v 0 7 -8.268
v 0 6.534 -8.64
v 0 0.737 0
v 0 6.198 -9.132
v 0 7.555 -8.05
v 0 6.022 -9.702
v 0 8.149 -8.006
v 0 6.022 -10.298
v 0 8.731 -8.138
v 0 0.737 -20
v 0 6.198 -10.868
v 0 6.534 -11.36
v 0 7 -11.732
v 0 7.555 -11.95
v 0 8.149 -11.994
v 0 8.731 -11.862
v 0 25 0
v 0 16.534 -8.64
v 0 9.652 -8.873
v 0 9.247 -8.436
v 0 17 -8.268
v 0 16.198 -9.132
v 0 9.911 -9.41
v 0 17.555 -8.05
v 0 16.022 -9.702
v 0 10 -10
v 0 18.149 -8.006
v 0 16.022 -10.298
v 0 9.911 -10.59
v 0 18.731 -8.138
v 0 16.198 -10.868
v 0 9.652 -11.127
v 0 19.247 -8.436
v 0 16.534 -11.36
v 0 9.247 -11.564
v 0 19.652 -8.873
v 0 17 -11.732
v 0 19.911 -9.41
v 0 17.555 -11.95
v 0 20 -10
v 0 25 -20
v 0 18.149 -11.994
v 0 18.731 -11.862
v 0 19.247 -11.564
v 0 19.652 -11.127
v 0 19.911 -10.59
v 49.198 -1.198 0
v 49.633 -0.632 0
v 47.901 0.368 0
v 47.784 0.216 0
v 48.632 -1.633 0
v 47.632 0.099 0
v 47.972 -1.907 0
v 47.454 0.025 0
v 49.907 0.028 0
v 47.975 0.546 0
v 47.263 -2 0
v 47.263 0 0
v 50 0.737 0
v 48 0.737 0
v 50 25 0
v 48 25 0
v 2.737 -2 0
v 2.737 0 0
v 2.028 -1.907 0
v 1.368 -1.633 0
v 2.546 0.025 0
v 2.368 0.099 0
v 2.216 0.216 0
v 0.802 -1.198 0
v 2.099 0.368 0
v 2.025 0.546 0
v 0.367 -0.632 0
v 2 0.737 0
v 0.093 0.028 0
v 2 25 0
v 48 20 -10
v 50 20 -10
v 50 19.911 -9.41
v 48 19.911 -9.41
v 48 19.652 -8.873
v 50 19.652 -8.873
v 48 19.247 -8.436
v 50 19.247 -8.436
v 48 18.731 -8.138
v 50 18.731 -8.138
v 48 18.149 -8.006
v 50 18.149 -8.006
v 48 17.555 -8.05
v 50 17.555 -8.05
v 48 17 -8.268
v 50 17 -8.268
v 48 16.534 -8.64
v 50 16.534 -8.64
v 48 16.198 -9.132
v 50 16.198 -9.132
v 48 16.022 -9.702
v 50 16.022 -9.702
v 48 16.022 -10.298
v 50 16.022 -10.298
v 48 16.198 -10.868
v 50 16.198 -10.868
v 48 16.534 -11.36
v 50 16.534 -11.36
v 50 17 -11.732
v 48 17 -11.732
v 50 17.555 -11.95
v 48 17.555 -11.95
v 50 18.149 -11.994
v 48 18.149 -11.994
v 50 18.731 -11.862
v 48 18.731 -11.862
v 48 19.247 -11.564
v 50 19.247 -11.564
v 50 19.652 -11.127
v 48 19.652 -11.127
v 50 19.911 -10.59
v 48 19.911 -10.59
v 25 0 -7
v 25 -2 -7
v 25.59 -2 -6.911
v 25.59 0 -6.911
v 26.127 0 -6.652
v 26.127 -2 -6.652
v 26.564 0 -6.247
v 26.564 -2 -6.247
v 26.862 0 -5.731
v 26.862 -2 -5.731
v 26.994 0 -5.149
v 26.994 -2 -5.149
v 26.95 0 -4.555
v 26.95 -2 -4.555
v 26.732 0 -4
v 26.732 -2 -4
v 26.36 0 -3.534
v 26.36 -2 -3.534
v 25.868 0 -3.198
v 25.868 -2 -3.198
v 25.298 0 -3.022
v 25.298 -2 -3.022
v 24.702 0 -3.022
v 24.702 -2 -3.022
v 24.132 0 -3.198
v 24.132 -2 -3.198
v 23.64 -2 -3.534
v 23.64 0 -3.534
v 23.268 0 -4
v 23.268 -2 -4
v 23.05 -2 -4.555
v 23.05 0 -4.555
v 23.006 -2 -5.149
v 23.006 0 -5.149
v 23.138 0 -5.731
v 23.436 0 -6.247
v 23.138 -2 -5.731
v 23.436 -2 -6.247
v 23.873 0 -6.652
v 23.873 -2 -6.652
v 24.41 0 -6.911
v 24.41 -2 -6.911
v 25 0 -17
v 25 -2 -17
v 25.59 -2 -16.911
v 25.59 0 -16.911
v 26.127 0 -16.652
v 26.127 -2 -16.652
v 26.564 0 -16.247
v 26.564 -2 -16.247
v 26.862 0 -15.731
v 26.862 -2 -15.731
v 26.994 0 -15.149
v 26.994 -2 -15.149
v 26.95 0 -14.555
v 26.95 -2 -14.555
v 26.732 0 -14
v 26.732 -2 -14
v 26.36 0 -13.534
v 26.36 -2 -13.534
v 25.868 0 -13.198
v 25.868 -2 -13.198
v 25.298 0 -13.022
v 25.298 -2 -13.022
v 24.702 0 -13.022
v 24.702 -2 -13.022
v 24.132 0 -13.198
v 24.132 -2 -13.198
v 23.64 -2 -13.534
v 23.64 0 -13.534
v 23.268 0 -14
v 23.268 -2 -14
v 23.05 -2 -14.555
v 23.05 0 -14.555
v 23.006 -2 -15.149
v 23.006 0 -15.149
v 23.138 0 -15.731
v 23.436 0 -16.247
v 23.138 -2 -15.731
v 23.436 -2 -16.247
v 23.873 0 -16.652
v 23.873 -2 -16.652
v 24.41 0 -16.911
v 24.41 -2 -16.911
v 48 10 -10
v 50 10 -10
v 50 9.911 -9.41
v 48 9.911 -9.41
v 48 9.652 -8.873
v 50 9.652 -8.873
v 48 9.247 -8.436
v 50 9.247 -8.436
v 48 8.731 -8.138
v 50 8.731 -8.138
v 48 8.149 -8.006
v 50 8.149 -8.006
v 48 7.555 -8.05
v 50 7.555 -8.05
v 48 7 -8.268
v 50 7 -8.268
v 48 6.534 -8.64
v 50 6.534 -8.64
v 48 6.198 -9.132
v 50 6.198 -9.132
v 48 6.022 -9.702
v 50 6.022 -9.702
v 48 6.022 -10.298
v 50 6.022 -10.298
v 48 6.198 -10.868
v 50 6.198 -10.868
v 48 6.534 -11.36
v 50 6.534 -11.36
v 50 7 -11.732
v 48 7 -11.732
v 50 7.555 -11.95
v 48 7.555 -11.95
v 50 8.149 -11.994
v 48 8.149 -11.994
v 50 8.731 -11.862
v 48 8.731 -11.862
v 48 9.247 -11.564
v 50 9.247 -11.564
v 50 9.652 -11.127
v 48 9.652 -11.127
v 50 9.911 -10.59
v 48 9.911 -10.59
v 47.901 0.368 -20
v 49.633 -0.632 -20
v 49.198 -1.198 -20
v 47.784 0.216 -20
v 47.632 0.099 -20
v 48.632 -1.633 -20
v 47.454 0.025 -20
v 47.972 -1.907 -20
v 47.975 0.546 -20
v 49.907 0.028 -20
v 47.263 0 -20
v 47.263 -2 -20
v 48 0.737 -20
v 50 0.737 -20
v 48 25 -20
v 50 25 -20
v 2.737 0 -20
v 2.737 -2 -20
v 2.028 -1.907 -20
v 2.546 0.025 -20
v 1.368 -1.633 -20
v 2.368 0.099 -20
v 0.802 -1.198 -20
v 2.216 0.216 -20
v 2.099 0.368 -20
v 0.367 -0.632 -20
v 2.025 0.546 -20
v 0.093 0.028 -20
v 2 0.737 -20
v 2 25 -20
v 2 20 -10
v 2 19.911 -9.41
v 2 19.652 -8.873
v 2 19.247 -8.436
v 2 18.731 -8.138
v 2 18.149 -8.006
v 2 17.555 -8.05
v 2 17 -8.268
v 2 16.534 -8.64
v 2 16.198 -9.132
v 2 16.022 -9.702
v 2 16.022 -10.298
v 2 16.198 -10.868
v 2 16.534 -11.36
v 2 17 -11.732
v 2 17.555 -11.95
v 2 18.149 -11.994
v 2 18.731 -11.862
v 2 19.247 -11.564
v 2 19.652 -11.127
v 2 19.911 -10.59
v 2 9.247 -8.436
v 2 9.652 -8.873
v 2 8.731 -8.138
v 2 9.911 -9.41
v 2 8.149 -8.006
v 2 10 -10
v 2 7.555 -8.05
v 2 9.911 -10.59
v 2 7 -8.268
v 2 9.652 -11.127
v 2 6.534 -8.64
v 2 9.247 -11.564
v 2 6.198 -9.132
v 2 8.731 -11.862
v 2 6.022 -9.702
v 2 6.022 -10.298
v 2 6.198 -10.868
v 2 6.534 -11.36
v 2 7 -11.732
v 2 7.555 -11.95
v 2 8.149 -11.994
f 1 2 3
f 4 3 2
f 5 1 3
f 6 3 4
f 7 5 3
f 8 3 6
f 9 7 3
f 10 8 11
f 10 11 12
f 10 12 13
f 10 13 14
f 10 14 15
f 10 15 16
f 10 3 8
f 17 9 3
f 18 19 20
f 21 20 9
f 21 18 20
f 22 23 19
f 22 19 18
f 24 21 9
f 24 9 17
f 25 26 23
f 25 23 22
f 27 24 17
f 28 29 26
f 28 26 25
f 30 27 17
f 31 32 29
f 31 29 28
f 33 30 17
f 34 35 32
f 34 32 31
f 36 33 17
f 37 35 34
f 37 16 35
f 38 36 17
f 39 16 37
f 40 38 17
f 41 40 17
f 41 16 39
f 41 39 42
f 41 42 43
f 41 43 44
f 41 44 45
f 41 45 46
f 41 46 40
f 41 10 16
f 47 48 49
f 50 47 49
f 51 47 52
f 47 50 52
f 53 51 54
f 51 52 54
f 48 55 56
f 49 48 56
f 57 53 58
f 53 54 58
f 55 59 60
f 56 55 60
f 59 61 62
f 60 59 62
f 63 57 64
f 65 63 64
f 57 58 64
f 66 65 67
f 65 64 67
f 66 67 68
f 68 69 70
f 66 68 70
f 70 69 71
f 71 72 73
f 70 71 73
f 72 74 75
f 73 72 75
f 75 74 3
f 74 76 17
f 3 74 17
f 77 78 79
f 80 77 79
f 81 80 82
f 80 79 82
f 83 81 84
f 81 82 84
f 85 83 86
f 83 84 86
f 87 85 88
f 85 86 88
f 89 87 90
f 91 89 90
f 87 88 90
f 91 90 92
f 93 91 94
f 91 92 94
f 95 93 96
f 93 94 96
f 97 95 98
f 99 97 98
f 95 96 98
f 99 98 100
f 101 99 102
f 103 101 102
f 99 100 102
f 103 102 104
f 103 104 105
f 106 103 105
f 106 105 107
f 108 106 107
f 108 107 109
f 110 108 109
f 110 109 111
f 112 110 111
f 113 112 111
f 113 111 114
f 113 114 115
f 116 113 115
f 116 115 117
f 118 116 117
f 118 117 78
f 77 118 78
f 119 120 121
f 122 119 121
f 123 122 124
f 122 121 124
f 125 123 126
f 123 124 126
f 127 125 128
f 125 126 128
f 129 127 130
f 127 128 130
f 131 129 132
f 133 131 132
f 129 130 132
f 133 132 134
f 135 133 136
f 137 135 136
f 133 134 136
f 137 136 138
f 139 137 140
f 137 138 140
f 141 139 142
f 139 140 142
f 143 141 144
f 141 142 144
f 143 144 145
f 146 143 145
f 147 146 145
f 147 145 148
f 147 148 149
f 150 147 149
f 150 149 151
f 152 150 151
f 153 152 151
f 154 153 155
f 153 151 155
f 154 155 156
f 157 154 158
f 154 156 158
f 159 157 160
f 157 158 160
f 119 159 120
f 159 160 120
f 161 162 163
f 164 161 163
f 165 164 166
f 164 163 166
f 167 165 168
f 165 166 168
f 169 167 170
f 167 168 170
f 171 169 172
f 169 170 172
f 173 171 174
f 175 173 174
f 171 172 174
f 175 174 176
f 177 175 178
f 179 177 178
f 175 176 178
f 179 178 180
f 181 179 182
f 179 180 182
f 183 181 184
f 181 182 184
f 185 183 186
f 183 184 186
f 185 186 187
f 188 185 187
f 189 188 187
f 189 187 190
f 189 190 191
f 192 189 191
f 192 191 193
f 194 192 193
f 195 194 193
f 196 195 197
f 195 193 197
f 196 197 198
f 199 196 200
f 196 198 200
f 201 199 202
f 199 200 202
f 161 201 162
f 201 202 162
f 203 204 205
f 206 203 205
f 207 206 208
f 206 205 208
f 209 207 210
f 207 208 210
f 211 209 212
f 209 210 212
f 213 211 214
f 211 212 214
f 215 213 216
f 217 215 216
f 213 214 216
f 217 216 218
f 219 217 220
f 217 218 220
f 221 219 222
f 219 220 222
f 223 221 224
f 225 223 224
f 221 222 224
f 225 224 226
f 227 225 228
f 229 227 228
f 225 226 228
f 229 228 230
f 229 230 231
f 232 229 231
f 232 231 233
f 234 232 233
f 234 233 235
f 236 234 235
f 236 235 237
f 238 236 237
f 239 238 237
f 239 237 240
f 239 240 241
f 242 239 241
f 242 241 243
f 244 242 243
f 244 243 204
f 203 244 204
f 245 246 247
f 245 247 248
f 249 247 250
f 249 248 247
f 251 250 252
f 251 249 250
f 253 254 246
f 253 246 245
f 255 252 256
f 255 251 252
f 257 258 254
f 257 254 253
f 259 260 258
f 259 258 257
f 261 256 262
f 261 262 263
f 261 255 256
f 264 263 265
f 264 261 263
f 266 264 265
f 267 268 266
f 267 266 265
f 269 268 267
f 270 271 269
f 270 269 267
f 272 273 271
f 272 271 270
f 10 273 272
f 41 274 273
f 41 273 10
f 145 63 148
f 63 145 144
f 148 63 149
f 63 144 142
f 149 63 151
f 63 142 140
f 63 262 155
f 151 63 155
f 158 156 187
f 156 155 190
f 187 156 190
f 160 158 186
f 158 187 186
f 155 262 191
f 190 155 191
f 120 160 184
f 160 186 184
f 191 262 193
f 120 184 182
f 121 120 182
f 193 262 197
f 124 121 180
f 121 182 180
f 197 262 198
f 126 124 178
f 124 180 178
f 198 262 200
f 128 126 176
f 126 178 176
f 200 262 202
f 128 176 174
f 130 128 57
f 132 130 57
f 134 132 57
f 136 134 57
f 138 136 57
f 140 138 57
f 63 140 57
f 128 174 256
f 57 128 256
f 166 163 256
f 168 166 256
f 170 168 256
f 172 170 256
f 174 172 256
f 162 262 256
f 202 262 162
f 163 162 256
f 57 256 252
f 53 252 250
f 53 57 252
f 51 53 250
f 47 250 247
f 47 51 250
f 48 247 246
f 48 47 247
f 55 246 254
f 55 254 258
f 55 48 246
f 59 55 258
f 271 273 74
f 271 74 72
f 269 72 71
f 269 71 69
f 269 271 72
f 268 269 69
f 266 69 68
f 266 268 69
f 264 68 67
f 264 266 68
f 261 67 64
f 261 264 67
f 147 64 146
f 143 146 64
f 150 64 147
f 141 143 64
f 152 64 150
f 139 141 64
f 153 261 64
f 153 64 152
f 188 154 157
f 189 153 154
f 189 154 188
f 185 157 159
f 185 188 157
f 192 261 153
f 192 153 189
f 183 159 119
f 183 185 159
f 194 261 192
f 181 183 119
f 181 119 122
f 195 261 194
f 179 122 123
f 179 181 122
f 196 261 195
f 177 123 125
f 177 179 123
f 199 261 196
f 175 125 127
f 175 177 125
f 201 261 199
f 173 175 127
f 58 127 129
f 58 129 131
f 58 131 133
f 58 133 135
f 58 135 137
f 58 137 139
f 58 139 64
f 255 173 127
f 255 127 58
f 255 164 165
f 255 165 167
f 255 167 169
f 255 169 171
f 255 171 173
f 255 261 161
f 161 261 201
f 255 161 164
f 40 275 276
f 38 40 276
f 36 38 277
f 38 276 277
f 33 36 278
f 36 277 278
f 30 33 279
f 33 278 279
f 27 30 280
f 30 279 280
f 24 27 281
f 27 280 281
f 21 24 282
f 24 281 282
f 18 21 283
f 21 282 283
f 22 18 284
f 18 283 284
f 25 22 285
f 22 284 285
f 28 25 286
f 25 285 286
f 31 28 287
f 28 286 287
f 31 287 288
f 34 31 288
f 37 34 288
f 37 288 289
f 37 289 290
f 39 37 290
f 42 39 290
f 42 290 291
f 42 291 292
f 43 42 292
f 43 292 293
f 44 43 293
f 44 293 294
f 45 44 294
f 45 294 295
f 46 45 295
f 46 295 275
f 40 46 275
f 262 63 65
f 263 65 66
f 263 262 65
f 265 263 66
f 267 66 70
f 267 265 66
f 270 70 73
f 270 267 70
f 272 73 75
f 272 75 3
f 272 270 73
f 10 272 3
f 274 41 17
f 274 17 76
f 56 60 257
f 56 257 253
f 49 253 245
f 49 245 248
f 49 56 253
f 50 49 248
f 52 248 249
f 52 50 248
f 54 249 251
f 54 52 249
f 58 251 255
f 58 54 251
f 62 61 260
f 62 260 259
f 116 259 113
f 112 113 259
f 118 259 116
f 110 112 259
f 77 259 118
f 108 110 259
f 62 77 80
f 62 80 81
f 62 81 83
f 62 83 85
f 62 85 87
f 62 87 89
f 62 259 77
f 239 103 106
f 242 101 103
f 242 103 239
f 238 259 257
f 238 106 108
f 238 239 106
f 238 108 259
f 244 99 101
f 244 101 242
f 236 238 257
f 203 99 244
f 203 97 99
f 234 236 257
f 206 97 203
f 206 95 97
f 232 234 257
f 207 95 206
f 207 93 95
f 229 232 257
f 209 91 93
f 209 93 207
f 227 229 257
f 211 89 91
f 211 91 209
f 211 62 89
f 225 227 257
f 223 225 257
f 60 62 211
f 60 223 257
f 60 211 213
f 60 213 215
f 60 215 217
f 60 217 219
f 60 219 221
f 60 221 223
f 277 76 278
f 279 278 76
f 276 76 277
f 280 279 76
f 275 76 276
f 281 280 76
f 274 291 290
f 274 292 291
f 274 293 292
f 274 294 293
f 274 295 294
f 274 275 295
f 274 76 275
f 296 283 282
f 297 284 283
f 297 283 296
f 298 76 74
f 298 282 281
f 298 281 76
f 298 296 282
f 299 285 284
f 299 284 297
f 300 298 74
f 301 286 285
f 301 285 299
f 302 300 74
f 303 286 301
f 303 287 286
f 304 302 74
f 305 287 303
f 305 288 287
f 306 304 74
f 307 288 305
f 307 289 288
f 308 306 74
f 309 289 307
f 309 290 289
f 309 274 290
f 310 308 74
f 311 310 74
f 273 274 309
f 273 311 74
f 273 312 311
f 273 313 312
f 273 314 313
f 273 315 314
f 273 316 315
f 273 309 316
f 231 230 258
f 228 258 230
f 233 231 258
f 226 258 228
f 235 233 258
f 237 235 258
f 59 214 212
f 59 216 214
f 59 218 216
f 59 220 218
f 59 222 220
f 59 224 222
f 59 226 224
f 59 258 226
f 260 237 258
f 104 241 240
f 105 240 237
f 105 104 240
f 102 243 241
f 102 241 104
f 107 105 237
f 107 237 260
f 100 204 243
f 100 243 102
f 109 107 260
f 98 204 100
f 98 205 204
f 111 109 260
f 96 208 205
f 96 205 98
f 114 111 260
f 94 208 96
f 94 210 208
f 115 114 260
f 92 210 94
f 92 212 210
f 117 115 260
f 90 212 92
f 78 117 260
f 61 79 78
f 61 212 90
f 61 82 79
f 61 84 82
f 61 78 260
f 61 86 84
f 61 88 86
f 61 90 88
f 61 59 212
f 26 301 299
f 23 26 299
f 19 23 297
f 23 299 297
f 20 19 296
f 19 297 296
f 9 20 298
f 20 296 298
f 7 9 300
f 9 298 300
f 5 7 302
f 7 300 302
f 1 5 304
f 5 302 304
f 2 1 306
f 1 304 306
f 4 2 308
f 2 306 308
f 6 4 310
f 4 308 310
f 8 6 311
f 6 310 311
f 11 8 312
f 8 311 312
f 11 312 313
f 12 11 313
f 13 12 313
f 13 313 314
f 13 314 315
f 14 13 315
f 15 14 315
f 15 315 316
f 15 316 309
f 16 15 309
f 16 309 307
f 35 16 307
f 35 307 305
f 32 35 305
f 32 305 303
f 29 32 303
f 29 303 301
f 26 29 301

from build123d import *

# Parameters (mm, degrees)
SKETCH_1_W                       = 50
SKETCH_1_H                       = 20
SM_BASE_FLANGE_1_DEPTH           = 2
SM_EDGE_FLANGE_1_STRIP_W         = 9.4732
SM_EDGE_FLANGE_1_STRIP_H         = 2
SM_EDGE_FLANGE_1_STRIP_CUT_DEPTH = 20
SM_EDGE_FLANGE_1_DEPTH           = 20
SM_EDGE_FLANGE_2_STRIP_W         = 9.4732
SM_EDGE_FLANGE_2_STRIP_H         = 2
SM_EDGE_FLANGE_2_STRIP_CUT_DEPTH = 20
SM_EDGE_FLANGE_2_DEPTH           = 20
SKETCH_12_R                      = 2
CUT_EXTRUDE_1_DEPTH              = 2
CUT_EXTRUDE_2_REACH              = 61.372
SKETCH_13_R                      = 2


# Sheet-metal steps are written as plain solids
with BuildPart() as part:
    # Sketch 1 → Базовая кромка1 (new body)
    with BuildSketch(Plane(origin=(0, 0, 0), x_dir=(1, 0, 0), z_dir=(0, 1, 0))):
        with Locations((25, 10)):
            Rectangle(SKETCH_1_W, SKETCH_1_H)
    extrude(amount=-SM_BASE_FLANGE_1_DEPTH)

    # Ребро-кромка1 strip (across the edge) → Ребро-кромка1 strip cut (cut)
    with BuildSketch(Plane(origin=(50, 0, 0), x_dir=(-1, 0, 0), z_dir=(0, 0, -1))):
        with Locations((-2, -1)):
            Rectangle(SM_EDGE_FLANGE_1_STRIP_W, SM_EDGE_FLANGE_1_STRIP_H)
    extrude(amount=SM_EDGE_FLANGE_1_STRIP_CUT_DEPTH, mode=Mode.SUBTRACT)

    # Ребро-кромка1 section (across the edge) → Ребро-кромка1 (add)
    with BuildSketch(Plane(origin=(50, 0, 0), x_dir=(-1, 0, 0), z_dir=(0, 0, -1))):
        with BuildLine():
            Line((0, 0.7366), (0, 25))
            Line((0, 25), (2, 25))
            Line((2, 25), (2, 0.7366))
            ThreePointArc((2, 0.7366), (2.215745145, 0.215745145), (2.7366, 0))
            Line((2.7366, 0), (2.7366, -2))
            ThreePointArc((2.7366, -2), (0.801531583, -1.198468417), (0, 0.7366))
        make_face()
    extrude(amount=SM_EDGE_FLANGE_1_DEPTH)

    # Ребро-кромка2 strip (across the edge) → Ребро-кромка2 strip cut (cut)
    with BuildSketch(Plane.XY.offset(-20)):
        with Locations((-2, -1)):
            Rectangle(SM_EDGE_FLANGE_2_STRIP_W, SM_EDGE_FLANGE_2_STRIP_H)
    extrude(amount=SM_EDGE_FLANGE_2_STRIP_CUT_DEPTH, mode=Mode.SUBTRACT)

    # Ребро-кромка2 section (across the edge) → Ребро-кромка2 (add)
    with BuildSketch(Plane.XY.offset(-20)):
        with BuildLine():
            Line((0, 0.7366), (0, 25))
            Line((0, 25), (2, 25))
            Line((2, 25), (2, 0.7366))
            ThreePointArc((2, 0.7366), (2.215745145, 0.215745145), (2.7366, 0))
            Line((2.7366, 0), (2.7366, -2))
            ThreePointArc((2.7366, -2), (0.801531583, -1.198468417), (0, 0.7366))
        make_face()
    extrude(amount=SM_EDGE_FLANGE_2_DEPTH)

    # Эскиз12 → Вырез-Вытянуть1 (cut)
    with BuildSketch(Plane.XZ.offset(2)):
        with Locations(Location((25, -5, 0), (0, 0, 270))):
            Circle(SKETCH_12_R)
        with Locations(Location((25, -15, 0), (0, 0, 270))):
            Circle(SKETCH_12_R)
    extrude(amount=-CUT_EXTRUDE_1_DEPTH, mode=Mode.SUBTRACT)

    # Вырез-Вытянуть2: up to this face of the body (flat: up to its plane)
    cut_extrude_2_end = Plane(part.part.faces().sort_by_distance((0, 12.8683, -10))[0])
    # Эскиз13 → Вырез-Вытянуть2 (cut, up to the picked face)
    with BuildSketch(Plane(origin=(50, 0, 0), x_dir=(0, 0, -1), z_dir=(1, 0, 0)), mode=Mode.PRIVATE) as cut_extrude_2_sk1:
        with Locations(Location((10, 8, 0), (0, 0, 90))):
            Circle(SKETCH_13_R)
    cut_extrude_2_tool1 = split(extrude(cut_extrude_2_sk1.sketch, amount=-CUT_EXTRUDE_2_REACH, mode=Mode.PRIVATE), bisect_by=cut_extrude_2_end, keep=Keep.BOTH, mode=Mode.PRIVATE)
    # Эскиз13 → Вырез-Вытянуть2 (cut, up to the picked face)
    with BuildSketch(Plane(origin=(50, 0, 0), x_dir=(0, 0, -1), z_dir=(1, 0, 0)), mode=Mode.PRIVATE) as cut_extrude_2_sk2:
        with Locations(Location((10, 18, 0), (0, 0, 90))):
            Circle(SKETCH_13_R)
    cut_extrude_2_tool2 = split(extrude(cut_extrude_2_sk2.sketch, amount=-CUT_EXTRUDE_2_REACH, mode=Mode.PRIVATE), bisect_by=cut_extrude_2_end, keep=Keep.BOTH, mode=Mode.PRIVATE)
    add(cut_extrude_2_tool1.solids().sort_by(Axis((50, 8, -10), (-1, 0, 0)))[0], mode=Mode.SUBTRACT)
    add(cut_extrude_2_tool2.solids().sort_by(Axis((50, 18, -10), (-1, 0, 0)))[0], mode=Mode.SUBTRACT)


solid = part.part
